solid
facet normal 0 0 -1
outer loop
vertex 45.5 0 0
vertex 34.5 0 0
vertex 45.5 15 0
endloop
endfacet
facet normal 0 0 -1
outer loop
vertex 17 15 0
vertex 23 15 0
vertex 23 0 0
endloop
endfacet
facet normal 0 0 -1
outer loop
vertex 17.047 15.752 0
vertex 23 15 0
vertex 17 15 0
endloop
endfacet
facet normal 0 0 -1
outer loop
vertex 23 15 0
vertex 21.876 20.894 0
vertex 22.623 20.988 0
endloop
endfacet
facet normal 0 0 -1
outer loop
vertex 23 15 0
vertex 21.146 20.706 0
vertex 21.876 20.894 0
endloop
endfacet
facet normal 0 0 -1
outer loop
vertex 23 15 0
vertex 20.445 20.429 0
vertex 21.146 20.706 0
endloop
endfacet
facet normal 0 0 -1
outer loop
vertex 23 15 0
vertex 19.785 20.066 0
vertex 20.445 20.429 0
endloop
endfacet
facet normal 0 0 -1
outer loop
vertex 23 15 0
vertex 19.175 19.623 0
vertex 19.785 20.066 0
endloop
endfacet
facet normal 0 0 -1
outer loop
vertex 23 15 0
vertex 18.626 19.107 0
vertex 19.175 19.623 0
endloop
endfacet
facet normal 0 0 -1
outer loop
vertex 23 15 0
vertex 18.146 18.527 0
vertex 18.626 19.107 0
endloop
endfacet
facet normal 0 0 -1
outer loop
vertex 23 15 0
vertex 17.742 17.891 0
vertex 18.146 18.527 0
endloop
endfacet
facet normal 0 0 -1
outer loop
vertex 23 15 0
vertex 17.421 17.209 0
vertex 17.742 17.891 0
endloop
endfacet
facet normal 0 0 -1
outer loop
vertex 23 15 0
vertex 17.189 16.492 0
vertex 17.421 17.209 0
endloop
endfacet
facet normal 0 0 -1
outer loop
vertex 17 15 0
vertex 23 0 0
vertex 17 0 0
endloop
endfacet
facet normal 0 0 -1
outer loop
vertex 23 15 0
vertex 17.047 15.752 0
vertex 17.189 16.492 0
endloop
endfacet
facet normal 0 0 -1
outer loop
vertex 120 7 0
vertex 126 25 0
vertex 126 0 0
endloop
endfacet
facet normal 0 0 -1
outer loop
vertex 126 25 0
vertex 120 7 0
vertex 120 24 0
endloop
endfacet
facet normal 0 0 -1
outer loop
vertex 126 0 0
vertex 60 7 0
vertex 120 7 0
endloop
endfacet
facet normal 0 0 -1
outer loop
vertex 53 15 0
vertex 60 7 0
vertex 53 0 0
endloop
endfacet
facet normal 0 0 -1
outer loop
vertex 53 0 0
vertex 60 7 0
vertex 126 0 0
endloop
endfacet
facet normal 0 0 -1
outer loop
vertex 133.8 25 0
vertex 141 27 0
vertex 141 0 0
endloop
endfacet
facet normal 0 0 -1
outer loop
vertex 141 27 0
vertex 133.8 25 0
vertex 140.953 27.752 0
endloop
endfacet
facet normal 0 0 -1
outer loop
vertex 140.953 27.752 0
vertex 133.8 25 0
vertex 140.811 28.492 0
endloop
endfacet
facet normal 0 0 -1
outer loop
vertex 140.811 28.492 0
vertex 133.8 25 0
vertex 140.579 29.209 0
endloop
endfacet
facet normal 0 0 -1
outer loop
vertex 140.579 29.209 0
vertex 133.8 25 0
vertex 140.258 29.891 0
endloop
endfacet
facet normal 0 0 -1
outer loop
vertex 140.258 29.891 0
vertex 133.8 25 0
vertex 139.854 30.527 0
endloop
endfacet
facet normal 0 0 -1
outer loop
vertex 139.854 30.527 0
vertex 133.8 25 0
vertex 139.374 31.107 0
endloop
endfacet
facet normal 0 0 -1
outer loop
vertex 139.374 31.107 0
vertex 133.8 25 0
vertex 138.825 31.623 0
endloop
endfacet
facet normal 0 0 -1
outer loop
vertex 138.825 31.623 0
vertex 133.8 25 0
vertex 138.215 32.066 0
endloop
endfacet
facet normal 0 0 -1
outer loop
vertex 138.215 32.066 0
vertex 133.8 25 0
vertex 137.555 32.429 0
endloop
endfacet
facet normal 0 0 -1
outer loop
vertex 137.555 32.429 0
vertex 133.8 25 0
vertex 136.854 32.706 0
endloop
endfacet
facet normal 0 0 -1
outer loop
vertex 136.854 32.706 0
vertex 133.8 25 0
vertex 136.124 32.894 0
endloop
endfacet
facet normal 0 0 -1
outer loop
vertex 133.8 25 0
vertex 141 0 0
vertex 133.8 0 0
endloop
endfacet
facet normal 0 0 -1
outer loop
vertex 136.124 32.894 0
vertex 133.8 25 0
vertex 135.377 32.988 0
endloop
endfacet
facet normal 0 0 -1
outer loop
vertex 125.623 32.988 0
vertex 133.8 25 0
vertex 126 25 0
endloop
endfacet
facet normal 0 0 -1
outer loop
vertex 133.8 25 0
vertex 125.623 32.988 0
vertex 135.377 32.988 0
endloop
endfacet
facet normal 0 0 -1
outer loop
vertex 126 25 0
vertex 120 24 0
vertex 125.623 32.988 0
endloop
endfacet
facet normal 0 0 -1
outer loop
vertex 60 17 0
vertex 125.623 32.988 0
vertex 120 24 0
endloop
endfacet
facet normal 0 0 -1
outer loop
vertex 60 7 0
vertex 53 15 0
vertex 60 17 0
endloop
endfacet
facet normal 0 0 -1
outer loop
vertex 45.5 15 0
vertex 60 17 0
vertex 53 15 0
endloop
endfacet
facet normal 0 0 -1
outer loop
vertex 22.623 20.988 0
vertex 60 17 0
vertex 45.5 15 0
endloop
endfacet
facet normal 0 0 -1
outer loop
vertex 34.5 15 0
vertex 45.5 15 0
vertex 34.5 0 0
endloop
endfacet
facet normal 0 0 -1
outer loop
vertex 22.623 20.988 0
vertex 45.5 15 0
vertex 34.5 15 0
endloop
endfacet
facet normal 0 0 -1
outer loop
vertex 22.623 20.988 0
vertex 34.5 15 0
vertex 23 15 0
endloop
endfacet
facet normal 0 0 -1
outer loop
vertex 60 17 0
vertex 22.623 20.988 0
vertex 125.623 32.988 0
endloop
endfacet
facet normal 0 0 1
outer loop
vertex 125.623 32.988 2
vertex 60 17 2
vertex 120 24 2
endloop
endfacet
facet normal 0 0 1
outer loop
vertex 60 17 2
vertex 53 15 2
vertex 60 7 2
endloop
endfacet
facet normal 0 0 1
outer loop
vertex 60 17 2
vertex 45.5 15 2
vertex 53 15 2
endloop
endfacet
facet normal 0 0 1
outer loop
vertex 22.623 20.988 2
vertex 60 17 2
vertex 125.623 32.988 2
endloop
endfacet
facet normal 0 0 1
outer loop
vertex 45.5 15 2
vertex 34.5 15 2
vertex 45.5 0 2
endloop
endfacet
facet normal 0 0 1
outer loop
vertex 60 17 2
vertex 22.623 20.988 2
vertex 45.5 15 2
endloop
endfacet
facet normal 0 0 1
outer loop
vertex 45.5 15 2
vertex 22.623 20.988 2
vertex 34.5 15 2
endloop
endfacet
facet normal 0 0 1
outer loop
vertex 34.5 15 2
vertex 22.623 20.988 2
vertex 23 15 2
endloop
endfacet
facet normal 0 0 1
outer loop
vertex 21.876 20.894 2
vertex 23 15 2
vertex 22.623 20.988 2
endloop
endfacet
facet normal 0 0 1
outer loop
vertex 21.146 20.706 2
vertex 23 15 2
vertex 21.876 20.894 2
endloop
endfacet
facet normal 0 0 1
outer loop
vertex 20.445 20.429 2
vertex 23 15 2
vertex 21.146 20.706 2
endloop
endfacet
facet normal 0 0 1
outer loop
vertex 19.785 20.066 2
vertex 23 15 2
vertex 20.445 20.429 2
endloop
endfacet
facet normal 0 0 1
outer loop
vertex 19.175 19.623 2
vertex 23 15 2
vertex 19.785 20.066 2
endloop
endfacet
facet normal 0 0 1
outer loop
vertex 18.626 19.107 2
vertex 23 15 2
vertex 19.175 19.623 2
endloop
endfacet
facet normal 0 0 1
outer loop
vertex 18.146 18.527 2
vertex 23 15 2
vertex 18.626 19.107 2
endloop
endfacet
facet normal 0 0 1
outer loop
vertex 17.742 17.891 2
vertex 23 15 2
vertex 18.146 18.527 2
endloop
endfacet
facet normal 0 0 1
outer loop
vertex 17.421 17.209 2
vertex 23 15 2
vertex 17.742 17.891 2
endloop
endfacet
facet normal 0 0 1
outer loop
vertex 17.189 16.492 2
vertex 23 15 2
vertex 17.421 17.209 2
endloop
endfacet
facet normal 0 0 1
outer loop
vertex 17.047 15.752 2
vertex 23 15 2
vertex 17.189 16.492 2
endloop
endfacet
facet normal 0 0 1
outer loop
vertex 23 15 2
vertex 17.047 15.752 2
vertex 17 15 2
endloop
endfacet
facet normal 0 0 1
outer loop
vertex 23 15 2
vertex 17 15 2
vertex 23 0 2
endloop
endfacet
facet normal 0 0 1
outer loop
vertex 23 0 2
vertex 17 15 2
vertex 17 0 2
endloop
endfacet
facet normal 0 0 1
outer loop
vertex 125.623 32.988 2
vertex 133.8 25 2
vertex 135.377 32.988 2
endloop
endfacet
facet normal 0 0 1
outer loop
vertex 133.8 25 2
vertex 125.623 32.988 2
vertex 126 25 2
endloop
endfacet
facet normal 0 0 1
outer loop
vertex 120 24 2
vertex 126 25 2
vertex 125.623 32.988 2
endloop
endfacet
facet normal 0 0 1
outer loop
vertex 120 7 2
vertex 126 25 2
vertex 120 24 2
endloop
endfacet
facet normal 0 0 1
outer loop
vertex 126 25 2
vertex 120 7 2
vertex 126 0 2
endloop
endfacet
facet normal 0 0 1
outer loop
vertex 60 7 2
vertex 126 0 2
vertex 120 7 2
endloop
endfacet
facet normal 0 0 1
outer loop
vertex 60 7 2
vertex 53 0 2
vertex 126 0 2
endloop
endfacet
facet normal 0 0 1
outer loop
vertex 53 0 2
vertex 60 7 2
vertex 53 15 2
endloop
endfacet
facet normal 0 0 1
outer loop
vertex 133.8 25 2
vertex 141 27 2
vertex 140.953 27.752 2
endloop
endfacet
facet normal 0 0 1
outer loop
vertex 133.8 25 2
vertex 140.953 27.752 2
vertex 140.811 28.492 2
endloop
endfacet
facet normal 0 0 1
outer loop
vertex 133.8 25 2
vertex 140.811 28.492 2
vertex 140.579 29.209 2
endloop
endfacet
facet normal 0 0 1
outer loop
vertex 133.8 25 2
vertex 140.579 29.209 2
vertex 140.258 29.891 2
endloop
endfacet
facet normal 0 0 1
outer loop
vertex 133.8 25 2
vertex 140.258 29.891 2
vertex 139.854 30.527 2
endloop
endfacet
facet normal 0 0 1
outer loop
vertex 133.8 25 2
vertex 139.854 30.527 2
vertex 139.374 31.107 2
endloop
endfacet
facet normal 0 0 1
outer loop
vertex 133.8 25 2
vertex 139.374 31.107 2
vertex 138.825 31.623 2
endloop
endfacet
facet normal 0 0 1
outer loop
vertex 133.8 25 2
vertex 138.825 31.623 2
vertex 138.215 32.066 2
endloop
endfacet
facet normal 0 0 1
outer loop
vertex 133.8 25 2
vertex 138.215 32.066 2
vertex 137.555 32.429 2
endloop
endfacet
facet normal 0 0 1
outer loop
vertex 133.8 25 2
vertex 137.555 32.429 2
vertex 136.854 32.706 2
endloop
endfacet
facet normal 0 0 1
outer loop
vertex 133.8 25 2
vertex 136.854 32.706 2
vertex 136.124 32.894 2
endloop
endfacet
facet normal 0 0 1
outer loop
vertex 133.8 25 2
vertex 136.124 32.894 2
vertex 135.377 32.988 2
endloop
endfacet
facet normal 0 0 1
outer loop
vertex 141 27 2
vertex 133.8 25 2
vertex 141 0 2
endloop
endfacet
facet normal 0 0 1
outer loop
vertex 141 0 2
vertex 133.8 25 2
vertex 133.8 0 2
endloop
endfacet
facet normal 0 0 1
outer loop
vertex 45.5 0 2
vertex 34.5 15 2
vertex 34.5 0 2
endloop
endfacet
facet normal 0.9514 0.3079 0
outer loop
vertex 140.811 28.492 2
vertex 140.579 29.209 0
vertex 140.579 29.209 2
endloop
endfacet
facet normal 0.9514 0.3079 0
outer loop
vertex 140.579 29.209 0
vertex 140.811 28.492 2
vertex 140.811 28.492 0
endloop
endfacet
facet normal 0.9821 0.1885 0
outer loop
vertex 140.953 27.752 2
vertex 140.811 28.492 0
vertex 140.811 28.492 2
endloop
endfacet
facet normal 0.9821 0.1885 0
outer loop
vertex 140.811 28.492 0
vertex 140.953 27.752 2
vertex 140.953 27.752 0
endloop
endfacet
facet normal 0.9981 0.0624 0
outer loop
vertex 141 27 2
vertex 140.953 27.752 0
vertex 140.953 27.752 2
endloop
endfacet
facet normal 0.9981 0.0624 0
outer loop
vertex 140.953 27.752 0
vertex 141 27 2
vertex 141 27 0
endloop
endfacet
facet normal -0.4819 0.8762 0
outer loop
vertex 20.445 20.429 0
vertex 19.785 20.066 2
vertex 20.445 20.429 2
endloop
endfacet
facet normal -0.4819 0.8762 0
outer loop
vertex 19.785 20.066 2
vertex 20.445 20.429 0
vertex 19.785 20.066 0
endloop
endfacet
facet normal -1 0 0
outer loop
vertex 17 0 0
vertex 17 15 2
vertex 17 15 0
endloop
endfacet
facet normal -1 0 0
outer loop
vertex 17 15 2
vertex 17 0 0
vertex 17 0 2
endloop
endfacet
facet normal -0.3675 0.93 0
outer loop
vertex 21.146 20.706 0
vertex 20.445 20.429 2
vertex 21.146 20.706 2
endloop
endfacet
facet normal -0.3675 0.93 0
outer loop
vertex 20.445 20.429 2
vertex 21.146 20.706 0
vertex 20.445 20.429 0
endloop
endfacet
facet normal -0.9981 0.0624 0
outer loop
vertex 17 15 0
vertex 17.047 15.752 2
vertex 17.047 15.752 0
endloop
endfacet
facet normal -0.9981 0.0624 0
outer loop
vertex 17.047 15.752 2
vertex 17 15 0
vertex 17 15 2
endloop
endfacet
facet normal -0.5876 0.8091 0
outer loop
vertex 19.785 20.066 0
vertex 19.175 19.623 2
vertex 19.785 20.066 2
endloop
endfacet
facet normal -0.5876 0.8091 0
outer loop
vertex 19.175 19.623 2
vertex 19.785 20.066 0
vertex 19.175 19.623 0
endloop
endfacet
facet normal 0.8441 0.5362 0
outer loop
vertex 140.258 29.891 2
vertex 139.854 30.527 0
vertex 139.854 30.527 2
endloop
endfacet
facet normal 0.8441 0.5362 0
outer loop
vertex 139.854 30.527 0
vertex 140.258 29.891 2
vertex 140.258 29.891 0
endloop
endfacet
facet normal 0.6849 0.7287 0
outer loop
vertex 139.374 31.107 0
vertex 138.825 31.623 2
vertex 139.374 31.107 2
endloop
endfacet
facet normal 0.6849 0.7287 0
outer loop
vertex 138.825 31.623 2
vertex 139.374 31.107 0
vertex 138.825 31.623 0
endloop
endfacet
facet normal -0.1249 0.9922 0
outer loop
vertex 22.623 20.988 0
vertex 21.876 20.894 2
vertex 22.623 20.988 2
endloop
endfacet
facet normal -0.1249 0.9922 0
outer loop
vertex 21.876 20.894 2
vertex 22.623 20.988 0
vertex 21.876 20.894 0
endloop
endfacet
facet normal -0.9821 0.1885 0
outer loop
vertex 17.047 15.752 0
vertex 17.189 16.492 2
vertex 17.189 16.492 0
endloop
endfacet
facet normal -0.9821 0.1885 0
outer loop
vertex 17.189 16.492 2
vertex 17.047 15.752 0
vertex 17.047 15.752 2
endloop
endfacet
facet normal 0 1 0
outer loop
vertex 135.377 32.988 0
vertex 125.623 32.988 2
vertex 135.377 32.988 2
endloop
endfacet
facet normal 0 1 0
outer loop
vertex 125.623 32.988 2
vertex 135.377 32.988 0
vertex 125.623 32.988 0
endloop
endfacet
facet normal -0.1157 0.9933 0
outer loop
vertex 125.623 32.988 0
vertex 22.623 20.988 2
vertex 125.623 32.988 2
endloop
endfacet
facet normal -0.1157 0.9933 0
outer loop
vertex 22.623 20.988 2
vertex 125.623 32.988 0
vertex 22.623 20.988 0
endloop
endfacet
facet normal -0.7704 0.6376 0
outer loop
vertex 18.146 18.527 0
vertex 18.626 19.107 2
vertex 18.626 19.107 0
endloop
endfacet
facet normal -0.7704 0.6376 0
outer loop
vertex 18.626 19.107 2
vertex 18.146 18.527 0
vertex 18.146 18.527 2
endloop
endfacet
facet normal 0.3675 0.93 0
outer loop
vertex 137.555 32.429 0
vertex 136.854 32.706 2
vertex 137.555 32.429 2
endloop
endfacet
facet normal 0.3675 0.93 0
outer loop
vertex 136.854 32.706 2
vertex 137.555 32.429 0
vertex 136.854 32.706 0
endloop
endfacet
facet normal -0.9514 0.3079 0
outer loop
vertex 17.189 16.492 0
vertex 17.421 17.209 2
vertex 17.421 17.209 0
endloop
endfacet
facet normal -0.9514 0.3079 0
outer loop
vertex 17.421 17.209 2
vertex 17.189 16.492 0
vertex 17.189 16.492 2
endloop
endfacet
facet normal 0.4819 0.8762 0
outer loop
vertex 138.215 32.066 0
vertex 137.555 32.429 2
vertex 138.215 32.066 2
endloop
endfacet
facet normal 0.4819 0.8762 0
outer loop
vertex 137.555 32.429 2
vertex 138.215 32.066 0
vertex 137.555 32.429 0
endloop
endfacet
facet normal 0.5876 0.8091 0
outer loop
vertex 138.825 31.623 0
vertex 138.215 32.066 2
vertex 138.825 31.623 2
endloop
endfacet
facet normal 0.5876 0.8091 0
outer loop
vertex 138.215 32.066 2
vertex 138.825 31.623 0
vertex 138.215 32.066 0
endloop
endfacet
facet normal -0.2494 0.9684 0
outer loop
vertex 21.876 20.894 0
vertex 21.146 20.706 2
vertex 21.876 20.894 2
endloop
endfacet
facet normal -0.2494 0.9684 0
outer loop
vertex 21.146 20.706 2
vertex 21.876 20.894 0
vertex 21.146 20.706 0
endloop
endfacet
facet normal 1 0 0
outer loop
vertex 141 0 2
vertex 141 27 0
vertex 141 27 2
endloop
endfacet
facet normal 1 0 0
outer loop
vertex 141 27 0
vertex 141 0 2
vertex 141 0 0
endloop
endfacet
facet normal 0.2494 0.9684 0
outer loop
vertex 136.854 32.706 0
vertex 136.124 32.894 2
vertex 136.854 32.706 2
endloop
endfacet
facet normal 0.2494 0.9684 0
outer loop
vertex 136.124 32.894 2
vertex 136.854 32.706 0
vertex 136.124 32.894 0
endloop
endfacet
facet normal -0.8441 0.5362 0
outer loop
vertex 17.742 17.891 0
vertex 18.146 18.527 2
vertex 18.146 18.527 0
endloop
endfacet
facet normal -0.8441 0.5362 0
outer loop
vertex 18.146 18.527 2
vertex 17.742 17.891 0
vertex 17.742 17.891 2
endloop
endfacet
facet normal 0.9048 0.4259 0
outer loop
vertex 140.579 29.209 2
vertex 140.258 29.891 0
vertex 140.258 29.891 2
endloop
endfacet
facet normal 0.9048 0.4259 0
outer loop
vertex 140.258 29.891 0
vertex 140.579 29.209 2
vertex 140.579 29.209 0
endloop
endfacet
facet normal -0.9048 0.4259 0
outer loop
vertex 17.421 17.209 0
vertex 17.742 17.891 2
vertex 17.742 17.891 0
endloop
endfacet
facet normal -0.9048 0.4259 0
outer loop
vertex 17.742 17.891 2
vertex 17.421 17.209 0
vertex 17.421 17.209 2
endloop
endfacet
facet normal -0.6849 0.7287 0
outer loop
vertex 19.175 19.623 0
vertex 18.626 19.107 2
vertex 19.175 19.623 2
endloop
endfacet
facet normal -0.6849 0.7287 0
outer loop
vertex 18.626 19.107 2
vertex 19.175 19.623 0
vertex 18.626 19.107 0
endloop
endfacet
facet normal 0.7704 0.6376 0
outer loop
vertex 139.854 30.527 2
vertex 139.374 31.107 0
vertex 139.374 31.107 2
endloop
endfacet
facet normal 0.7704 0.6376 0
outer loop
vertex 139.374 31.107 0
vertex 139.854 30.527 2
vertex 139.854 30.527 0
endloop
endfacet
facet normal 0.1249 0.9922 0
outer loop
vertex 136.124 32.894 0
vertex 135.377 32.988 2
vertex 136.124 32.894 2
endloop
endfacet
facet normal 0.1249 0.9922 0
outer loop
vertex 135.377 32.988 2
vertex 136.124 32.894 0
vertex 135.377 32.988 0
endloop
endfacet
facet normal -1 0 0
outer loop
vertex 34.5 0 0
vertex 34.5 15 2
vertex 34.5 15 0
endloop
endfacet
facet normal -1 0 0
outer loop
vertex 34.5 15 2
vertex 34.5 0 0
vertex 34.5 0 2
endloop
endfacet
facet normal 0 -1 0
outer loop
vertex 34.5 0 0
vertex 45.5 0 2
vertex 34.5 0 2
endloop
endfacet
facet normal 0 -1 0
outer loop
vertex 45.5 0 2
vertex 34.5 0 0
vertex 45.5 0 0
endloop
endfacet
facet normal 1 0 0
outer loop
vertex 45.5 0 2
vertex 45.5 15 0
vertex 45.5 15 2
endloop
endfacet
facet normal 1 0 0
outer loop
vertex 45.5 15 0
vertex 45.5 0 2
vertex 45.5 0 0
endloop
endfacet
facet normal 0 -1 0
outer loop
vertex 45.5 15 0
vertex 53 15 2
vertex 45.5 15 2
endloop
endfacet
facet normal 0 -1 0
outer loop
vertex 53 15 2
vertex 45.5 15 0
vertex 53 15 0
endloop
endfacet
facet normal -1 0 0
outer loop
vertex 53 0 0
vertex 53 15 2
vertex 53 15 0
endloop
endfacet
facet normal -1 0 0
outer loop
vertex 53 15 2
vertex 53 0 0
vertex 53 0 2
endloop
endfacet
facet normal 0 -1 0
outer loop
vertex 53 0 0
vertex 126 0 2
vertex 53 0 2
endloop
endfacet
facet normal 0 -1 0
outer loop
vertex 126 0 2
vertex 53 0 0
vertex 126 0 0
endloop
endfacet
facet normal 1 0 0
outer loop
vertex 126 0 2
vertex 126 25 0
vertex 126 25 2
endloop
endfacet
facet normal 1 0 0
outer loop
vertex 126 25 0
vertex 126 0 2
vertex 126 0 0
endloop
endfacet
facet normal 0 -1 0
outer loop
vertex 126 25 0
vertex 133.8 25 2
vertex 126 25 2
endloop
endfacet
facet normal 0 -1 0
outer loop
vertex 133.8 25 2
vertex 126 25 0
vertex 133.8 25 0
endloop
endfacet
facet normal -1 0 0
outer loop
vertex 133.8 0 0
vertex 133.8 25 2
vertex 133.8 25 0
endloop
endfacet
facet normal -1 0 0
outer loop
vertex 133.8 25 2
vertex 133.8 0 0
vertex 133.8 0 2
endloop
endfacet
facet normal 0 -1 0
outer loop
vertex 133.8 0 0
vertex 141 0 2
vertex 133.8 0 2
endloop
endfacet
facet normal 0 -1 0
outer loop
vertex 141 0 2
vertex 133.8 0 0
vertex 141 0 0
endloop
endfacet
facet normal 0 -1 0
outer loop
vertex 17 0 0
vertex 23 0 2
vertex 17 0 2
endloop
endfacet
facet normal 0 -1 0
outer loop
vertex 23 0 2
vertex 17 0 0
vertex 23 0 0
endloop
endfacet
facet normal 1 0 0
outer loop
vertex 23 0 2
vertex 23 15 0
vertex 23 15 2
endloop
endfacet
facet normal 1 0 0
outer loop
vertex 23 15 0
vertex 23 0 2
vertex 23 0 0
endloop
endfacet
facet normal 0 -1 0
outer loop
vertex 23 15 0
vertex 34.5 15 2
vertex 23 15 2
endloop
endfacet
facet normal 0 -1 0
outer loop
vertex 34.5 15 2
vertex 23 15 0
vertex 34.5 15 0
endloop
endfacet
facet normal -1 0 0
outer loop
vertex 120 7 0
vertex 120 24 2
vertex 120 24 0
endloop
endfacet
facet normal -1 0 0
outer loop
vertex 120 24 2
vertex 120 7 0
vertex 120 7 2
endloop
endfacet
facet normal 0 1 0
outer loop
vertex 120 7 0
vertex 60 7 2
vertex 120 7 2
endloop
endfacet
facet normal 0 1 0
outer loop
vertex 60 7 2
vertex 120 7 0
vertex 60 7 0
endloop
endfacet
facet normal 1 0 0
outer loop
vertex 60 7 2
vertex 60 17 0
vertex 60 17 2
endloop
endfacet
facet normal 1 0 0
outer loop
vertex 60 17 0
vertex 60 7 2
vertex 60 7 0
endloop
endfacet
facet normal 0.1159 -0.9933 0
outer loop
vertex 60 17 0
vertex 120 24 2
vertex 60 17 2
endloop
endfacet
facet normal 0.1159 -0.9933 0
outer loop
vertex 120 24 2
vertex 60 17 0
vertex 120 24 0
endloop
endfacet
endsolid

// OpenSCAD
$fn=50;
largeur=45;
longueur=150;

epaisseur_plaque = 2;
epaisseur_attache= 2;


module plaque() {
    difference() {
        square([longueur, largeur]);
        trou1();
        trou2();
    }
}
module trou1() {
    translate([23,0]) difference() {
        square([30,15]);
        translate([11.5,0]) square([11,15]);
    }
}
module trou2() {
    translate([126,0])
        square([7.8,25]);
}
module trou2_marge() {
    translate([126,0])
        square([9,27]);
    
}


module attaches() {
    difference() {
         minkowski(){
            trou1();
            circle();
        }
        trou1();
    }
    difference() {
        minkowski(){
            trou2_marge();
            circle();
        }
        trou2();
    }
}

difference() {
    intersection() {
        union() {
            linear_extrude(height=epaisseur_attache)
                attaches();
            linear_extrude(height=epaisseur_plaque)
                minkowski() {
                    hull() attaches();
                    circle(d=10);
                }
        }
        linear_extrude(height=epaisseur_attache)
            plaque();
    }
    linear_extrude(height=epaisseur_plaque) 
        polygon(
            points=[[ 60, 7], [60, 17],
                    [120, 7], [120, 24]],
            paths =[[0,2,3,1]]);
}
